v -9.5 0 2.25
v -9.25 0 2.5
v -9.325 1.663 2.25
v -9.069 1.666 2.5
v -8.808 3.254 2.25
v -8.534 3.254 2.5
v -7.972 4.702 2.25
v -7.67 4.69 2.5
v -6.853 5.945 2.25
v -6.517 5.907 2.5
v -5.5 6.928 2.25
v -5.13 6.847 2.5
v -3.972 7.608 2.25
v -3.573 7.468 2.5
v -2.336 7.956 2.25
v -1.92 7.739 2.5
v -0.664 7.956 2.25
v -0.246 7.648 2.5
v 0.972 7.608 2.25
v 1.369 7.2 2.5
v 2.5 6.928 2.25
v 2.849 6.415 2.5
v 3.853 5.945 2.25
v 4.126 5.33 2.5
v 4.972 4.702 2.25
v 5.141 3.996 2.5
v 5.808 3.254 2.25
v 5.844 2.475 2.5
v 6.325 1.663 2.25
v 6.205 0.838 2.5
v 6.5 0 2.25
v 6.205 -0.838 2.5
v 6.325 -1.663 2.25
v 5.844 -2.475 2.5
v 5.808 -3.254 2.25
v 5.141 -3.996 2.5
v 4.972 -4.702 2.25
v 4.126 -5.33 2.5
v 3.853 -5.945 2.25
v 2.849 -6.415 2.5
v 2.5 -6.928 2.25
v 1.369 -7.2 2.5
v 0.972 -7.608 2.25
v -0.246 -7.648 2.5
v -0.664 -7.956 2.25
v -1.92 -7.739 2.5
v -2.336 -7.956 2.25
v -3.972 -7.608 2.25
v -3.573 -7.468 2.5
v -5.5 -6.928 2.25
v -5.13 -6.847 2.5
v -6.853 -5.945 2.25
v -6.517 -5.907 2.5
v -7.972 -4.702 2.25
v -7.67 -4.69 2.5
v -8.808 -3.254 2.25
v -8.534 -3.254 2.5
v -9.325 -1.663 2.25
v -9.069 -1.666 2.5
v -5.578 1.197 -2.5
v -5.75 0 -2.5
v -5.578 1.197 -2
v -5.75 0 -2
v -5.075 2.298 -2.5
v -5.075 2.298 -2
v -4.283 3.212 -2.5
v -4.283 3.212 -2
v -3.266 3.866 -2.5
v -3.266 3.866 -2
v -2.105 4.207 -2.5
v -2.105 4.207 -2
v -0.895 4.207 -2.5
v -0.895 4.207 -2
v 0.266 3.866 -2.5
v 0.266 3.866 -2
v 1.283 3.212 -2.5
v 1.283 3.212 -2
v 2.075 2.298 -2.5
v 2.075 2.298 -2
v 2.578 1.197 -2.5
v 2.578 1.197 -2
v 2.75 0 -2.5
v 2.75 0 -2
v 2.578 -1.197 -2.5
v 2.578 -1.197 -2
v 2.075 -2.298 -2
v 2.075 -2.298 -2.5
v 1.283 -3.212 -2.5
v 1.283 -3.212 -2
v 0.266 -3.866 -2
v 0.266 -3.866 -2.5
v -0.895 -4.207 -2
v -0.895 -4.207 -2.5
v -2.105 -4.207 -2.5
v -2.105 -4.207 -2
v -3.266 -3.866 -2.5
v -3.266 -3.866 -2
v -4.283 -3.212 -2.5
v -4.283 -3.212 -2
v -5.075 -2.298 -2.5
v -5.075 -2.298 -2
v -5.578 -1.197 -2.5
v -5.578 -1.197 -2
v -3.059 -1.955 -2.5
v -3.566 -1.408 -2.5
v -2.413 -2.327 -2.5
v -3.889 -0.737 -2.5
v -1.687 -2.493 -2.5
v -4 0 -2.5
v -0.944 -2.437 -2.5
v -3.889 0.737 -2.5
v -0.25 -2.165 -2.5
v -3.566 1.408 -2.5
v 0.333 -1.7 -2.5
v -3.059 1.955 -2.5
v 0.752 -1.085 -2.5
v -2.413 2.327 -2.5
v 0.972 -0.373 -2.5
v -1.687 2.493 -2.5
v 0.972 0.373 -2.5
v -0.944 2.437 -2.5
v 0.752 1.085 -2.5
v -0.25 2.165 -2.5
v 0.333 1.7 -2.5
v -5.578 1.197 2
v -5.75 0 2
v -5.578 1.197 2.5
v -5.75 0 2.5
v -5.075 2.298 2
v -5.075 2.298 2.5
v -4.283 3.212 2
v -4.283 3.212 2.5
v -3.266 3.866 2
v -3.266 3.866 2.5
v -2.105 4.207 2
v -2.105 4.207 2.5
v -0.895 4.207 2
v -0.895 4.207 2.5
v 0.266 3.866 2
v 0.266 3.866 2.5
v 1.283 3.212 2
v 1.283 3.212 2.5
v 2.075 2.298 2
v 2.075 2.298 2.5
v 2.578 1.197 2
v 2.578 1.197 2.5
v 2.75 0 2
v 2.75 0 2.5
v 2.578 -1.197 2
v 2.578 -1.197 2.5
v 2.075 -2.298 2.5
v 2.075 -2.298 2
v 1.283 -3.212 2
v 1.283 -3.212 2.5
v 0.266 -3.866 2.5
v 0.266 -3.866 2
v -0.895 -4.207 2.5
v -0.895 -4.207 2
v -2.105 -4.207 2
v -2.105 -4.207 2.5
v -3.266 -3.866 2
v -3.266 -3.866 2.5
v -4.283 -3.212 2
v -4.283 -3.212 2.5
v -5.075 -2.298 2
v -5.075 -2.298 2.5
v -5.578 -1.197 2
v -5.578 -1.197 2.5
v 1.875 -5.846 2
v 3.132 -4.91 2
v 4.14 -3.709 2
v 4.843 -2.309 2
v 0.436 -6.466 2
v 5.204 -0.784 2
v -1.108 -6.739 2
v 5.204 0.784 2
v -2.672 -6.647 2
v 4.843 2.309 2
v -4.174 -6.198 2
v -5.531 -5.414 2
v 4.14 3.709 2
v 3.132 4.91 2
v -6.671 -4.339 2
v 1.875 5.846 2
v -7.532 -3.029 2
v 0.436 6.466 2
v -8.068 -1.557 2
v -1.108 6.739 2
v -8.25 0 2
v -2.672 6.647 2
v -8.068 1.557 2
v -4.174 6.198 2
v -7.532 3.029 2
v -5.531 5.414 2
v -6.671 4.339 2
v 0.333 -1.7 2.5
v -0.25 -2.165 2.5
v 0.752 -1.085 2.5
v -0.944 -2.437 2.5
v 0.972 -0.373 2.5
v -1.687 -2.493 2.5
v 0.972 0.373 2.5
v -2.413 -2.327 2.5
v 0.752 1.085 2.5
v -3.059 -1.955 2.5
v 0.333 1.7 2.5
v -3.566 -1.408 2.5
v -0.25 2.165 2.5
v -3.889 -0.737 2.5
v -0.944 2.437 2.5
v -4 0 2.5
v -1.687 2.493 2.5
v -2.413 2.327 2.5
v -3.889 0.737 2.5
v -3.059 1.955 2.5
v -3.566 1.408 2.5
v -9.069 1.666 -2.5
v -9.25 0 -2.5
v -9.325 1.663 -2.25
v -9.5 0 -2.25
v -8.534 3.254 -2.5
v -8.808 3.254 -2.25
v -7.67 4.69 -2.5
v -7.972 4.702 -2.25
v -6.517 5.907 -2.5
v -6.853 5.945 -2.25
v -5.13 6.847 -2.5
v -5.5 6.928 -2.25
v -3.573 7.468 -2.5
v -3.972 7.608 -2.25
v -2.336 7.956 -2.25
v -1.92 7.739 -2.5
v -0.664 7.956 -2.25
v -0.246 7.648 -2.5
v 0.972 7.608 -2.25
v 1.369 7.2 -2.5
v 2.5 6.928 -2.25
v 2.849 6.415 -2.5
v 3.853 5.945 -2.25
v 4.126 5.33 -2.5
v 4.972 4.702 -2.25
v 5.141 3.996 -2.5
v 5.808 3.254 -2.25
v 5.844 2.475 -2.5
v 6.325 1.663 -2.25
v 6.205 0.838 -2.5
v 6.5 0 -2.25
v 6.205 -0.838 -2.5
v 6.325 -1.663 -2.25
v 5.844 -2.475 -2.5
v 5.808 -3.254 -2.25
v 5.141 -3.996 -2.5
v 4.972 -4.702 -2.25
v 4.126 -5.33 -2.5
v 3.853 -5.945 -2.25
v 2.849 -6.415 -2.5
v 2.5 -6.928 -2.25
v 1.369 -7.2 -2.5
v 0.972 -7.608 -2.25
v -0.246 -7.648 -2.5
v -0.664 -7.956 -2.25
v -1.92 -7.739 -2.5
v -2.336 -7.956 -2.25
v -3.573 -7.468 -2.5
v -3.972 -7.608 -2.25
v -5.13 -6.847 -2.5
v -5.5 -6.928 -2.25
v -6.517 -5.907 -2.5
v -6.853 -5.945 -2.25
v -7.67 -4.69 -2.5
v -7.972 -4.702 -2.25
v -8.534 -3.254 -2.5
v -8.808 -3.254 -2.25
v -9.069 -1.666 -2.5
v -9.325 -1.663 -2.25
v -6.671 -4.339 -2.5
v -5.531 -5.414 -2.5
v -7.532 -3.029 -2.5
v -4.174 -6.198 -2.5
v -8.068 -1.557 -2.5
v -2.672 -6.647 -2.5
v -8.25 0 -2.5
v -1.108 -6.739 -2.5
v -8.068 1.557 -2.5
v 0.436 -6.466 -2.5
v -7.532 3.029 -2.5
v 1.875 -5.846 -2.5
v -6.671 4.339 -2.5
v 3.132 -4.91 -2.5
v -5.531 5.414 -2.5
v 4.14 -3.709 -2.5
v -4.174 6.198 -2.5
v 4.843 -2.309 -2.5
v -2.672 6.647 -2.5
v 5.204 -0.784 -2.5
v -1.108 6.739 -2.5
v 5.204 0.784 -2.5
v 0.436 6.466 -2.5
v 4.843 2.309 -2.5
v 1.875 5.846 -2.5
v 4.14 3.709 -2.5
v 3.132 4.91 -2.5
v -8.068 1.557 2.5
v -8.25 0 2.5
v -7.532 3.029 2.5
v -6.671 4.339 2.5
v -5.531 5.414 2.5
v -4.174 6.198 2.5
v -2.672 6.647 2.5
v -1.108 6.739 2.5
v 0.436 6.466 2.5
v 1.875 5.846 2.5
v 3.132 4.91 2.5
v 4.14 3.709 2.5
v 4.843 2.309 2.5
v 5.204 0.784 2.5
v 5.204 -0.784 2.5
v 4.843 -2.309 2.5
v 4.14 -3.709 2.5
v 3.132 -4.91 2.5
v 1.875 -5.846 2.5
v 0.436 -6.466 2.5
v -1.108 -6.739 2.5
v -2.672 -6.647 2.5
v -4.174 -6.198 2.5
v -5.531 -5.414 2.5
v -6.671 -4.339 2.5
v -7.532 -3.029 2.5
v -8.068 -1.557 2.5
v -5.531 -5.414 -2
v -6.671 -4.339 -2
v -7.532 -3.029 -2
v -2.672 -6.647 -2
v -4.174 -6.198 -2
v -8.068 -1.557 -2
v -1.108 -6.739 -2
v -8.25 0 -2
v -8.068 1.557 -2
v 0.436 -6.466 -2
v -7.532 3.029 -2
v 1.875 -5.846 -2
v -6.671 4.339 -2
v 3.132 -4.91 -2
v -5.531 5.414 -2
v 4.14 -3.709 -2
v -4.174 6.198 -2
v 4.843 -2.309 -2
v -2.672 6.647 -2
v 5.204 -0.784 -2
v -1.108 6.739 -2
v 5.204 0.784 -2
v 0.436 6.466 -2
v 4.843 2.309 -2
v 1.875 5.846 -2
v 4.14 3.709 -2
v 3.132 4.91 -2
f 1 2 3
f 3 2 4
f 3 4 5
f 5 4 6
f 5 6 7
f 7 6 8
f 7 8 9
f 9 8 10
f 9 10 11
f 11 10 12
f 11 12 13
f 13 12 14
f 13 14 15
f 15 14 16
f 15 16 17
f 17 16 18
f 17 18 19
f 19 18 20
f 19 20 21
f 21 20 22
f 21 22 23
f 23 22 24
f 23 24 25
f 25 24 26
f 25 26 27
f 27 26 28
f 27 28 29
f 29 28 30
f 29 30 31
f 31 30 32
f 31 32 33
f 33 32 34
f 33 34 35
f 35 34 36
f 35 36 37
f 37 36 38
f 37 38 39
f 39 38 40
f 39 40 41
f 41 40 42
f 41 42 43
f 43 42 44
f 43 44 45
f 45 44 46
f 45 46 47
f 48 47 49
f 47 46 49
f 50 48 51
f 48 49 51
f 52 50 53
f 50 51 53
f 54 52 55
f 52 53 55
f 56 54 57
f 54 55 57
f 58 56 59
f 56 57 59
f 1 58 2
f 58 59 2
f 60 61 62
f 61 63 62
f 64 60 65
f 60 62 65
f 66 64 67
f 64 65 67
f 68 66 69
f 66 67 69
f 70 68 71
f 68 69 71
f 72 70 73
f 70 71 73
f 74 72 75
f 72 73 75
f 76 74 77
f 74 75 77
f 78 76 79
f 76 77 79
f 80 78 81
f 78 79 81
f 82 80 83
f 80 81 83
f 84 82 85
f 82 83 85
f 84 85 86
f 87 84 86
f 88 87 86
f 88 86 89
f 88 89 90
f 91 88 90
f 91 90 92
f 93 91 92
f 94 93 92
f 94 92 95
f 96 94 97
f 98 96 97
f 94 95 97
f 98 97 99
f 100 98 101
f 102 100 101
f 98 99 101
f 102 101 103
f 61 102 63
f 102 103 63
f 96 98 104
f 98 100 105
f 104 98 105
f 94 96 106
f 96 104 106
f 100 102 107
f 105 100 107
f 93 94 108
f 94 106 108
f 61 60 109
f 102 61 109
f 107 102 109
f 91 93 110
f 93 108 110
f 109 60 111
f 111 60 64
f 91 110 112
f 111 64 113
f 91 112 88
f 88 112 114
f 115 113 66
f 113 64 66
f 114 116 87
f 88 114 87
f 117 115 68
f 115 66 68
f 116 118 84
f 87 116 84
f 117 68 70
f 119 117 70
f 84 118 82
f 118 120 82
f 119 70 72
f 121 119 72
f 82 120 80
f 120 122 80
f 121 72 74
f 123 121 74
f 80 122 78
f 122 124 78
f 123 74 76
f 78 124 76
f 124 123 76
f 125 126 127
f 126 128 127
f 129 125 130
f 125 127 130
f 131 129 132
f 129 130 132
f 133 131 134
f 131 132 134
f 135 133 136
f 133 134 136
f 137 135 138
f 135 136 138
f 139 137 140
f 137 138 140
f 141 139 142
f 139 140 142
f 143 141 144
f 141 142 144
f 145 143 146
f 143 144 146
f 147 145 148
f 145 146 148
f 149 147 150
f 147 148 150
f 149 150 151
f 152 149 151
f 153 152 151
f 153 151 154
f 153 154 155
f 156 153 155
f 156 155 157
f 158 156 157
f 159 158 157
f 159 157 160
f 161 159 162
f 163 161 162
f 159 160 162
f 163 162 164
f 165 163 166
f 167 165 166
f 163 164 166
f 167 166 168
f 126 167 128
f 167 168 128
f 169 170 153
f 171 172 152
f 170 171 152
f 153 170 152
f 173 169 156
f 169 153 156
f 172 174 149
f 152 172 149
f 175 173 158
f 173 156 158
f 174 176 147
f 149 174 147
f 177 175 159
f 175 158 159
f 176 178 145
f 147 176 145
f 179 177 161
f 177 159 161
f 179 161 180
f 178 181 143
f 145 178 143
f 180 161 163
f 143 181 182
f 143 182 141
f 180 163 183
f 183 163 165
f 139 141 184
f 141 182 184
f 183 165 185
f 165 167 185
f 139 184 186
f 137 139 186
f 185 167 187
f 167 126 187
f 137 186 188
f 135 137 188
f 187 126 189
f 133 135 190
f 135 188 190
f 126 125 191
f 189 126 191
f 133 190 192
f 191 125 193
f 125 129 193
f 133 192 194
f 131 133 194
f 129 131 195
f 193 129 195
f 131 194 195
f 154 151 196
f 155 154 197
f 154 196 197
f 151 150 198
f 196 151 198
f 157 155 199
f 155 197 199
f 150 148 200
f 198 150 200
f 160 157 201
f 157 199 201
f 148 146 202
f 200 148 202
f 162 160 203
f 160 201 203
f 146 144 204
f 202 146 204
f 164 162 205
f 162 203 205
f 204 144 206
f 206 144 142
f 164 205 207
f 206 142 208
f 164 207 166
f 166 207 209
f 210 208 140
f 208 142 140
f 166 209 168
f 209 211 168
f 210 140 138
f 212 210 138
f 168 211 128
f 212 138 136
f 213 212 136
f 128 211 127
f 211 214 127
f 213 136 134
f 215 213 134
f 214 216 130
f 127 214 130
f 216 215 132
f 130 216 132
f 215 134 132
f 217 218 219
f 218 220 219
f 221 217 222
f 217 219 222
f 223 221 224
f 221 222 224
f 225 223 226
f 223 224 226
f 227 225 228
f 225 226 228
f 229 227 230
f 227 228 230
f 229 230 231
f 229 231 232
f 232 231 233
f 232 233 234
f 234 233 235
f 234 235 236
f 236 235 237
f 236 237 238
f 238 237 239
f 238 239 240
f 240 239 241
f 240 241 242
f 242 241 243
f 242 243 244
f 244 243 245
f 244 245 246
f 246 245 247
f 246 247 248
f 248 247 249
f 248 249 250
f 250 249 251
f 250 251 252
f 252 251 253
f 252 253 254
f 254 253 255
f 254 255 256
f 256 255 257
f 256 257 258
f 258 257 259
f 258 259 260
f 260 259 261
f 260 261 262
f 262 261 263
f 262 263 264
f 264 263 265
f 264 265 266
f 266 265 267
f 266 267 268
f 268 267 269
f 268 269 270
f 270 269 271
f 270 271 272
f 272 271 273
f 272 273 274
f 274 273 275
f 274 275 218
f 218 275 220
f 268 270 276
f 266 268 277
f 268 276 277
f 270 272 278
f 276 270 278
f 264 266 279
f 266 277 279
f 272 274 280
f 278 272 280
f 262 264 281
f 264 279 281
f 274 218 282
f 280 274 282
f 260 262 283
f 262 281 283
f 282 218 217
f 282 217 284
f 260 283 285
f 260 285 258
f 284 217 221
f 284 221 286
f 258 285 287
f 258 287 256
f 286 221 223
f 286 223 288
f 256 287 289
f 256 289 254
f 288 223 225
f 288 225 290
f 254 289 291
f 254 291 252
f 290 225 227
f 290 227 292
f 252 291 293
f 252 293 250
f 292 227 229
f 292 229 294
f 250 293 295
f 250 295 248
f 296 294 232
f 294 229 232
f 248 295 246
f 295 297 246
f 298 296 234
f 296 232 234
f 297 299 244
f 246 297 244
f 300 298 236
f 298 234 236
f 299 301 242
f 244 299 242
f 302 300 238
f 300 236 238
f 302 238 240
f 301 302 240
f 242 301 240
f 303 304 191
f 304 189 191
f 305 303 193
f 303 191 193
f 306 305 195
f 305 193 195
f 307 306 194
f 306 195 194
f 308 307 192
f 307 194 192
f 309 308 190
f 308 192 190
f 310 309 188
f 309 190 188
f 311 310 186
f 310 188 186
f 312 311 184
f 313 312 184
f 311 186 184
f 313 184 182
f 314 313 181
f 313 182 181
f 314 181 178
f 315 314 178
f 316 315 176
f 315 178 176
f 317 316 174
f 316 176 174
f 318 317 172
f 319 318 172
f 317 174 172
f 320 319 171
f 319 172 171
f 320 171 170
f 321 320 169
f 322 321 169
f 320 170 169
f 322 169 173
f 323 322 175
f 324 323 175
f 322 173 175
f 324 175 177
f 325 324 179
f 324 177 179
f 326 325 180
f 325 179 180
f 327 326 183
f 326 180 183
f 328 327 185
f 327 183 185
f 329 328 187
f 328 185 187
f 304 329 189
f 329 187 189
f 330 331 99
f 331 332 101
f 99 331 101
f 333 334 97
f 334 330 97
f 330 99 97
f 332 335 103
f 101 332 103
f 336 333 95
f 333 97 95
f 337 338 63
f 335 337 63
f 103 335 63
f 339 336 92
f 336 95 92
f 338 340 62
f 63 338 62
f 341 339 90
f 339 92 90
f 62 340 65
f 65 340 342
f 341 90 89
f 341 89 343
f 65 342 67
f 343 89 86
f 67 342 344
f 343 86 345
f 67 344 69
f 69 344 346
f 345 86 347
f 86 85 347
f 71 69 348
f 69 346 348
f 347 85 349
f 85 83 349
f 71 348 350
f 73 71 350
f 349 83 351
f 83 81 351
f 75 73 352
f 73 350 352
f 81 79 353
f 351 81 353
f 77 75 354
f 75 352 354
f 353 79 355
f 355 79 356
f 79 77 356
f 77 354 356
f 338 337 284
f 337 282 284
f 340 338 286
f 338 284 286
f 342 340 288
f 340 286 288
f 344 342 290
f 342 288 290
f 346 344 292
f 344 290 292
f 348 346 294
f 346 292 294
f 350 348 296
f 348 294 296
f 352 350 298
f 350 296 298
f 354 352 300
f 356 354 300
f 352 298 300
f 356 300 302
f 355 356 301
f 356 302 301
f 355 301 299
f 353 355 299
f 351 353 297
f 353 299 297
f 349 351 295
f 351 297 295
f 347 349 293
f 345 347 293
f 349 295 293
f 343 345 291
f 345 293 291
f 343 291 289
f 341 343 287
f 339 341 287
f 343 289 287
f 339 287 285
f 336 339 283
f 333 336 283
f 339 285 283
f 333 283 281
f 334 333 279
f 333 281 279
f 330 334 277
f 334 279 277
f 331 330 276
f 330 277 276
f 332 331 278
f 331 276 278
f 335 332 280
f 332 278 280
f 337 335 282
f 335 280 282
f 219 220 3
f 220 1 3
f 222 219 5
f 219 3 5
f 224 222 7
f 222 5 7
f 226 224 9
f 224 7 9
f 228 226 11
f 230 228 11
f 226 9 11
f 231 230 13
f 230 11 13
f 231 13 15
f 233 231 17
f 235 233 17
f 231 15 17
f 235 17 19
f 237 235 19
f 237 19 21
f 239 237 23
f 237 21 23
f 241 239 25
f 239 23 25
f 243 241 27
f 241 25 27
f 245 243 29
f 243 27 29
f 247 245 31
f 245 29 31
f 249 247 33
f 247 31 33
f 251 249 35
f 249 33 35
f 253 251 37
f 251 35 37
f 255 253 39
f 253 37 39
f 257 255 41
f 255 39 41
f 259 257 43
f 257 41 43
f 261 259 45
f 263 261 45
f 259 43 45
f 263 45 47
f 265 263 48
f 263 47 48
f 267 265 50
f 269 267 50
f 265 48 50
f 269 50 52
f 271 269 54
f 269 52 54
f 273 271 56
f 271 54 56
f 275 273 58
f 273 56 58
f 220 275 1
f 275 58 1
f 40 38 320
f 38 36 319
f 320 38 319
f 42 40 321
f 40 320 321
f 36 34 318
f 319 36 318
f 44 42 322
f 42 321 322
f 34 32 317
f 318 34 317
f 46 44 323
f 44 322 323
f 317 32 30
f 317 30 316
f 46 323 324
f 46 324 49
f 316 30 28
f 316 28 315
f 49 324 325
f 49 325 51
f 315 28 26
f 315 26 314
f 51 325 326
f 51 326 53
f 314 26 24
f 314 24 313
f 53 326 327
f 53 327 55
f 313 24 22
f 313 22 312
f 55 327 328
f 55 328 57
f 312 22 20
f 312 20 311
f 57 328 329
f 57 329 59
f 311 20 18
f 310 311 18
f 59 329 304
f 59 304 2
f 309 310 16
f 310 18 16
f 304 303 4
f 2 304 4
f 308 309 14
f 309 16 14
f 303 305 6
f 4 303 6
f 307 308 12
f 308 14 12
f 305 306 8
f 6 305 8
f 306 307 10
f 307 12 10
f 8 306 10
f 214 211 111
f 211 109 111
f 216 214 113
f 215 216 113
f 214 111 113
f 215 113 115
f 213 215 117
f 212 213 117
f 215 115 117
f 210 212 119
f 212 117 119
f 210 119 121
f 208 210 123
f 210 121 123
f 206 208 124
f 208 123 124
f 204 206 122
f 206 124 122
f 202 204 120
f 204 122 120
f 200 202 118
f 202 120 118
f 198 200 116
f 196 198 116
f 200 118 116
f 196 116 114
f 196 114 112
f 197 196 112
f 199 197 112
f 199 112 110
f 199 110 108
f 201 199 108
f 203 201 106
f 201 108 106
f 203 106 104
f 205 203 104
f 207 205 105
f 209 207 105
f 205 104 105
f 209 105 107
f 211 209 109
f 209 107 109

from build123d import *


with BuildPart() as part:
    # Sketch1 → Revolve1 (revolve)
    with BuildSketch(Plane.XZ, mode=Mode.PRIVATE) as revolve1_sk:
        Polygon((6.5, 2.25), (6.25, 2.5), (5.25, 2.5), (5.25, 2), (2.75, 2), (2.75, 2.5), (1, 2.5), (1, -2.5), (2.75, -2.5), (2.75, -2), (5.25, -2), (5.25, -2.5), (6.25, -2.5), (6.5, -2.25), align=None)
    revolve(revolve1_sk.sketch.rotate(Axis((-1.5, 0, 2.5), (0, 0, -1)), 180), axis=Axis((-1.5, 0, 2.5), (0, 0, -1)))


solid = part.part
